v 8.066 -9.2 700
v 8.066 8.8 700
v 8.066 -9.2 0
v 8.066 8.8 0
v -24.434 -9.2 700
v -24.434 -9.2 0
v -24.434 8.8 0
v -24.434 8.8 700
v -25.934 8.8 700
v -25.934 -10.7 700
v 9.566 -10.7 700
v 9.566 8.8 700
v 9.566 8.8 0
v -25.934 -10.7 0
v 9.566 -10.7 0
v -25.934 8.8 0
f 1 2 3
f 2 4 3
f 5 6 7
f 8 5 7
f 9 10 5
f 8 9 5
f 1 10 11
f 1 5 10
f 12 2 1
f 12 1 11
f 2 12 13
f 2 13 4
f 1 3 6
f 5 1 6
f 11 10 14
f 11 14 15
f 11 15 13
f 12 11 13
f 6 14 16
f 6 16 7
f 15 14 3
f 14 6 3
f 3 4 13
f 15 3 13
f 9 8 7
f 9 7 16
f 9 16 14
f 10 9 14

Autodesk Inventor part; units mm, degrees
ref_plane "YZ Plane" through (0, 0, 0) normal (1, 0, 0) x (0, 1, 0)
ref_plane "XZ Plane" through (0, 0, 0) normal (0, 1, 0) x (-1, 0, 0)
ref_plane "XY Plane" through (0, 0, 0) normal (0, 0, 1) x (1, 0, 0)
sketch "Skizze1" plane through (0, 0, 0) normal (0, 0, 1) x (1, 0, 0)
  line L0 (-25.9341, 8.8004) -> (-25.9341, -10.6996)
  line L1 (-25.9341, -10.6996) -> (9.5659, -10.6996)
  line L2 (9.5659, -10.6996) -> (9.5659, 8.8004)
  line L3 (9.5659, 8.8004) -> (8.0659, 8.8004)
  line L4 (8.0659, 8.8004) -> (8.0659, -9.1996)
  line L5 (8.0659, -9.1996) -> (-24.4341, -9.1996)
  line L6 (-24.4341, -9.1996) -> (-24.4341, 8.8004)
  line L7 (-24.4341, 8.8004) -> (-25.9341, 8.8004)
  point P0 (0, 0)
  dimension "d0" = 35.5
  dimension "d1" = 32.5
  dimension "d2" = 1.5
  dimension "d3" = 19.5
  dimension "d4" = 1.5
extrude "Extrusion1" add sketch "Skizze1" along normal blind 700
properties part number "Grundstange Bauhaus"
